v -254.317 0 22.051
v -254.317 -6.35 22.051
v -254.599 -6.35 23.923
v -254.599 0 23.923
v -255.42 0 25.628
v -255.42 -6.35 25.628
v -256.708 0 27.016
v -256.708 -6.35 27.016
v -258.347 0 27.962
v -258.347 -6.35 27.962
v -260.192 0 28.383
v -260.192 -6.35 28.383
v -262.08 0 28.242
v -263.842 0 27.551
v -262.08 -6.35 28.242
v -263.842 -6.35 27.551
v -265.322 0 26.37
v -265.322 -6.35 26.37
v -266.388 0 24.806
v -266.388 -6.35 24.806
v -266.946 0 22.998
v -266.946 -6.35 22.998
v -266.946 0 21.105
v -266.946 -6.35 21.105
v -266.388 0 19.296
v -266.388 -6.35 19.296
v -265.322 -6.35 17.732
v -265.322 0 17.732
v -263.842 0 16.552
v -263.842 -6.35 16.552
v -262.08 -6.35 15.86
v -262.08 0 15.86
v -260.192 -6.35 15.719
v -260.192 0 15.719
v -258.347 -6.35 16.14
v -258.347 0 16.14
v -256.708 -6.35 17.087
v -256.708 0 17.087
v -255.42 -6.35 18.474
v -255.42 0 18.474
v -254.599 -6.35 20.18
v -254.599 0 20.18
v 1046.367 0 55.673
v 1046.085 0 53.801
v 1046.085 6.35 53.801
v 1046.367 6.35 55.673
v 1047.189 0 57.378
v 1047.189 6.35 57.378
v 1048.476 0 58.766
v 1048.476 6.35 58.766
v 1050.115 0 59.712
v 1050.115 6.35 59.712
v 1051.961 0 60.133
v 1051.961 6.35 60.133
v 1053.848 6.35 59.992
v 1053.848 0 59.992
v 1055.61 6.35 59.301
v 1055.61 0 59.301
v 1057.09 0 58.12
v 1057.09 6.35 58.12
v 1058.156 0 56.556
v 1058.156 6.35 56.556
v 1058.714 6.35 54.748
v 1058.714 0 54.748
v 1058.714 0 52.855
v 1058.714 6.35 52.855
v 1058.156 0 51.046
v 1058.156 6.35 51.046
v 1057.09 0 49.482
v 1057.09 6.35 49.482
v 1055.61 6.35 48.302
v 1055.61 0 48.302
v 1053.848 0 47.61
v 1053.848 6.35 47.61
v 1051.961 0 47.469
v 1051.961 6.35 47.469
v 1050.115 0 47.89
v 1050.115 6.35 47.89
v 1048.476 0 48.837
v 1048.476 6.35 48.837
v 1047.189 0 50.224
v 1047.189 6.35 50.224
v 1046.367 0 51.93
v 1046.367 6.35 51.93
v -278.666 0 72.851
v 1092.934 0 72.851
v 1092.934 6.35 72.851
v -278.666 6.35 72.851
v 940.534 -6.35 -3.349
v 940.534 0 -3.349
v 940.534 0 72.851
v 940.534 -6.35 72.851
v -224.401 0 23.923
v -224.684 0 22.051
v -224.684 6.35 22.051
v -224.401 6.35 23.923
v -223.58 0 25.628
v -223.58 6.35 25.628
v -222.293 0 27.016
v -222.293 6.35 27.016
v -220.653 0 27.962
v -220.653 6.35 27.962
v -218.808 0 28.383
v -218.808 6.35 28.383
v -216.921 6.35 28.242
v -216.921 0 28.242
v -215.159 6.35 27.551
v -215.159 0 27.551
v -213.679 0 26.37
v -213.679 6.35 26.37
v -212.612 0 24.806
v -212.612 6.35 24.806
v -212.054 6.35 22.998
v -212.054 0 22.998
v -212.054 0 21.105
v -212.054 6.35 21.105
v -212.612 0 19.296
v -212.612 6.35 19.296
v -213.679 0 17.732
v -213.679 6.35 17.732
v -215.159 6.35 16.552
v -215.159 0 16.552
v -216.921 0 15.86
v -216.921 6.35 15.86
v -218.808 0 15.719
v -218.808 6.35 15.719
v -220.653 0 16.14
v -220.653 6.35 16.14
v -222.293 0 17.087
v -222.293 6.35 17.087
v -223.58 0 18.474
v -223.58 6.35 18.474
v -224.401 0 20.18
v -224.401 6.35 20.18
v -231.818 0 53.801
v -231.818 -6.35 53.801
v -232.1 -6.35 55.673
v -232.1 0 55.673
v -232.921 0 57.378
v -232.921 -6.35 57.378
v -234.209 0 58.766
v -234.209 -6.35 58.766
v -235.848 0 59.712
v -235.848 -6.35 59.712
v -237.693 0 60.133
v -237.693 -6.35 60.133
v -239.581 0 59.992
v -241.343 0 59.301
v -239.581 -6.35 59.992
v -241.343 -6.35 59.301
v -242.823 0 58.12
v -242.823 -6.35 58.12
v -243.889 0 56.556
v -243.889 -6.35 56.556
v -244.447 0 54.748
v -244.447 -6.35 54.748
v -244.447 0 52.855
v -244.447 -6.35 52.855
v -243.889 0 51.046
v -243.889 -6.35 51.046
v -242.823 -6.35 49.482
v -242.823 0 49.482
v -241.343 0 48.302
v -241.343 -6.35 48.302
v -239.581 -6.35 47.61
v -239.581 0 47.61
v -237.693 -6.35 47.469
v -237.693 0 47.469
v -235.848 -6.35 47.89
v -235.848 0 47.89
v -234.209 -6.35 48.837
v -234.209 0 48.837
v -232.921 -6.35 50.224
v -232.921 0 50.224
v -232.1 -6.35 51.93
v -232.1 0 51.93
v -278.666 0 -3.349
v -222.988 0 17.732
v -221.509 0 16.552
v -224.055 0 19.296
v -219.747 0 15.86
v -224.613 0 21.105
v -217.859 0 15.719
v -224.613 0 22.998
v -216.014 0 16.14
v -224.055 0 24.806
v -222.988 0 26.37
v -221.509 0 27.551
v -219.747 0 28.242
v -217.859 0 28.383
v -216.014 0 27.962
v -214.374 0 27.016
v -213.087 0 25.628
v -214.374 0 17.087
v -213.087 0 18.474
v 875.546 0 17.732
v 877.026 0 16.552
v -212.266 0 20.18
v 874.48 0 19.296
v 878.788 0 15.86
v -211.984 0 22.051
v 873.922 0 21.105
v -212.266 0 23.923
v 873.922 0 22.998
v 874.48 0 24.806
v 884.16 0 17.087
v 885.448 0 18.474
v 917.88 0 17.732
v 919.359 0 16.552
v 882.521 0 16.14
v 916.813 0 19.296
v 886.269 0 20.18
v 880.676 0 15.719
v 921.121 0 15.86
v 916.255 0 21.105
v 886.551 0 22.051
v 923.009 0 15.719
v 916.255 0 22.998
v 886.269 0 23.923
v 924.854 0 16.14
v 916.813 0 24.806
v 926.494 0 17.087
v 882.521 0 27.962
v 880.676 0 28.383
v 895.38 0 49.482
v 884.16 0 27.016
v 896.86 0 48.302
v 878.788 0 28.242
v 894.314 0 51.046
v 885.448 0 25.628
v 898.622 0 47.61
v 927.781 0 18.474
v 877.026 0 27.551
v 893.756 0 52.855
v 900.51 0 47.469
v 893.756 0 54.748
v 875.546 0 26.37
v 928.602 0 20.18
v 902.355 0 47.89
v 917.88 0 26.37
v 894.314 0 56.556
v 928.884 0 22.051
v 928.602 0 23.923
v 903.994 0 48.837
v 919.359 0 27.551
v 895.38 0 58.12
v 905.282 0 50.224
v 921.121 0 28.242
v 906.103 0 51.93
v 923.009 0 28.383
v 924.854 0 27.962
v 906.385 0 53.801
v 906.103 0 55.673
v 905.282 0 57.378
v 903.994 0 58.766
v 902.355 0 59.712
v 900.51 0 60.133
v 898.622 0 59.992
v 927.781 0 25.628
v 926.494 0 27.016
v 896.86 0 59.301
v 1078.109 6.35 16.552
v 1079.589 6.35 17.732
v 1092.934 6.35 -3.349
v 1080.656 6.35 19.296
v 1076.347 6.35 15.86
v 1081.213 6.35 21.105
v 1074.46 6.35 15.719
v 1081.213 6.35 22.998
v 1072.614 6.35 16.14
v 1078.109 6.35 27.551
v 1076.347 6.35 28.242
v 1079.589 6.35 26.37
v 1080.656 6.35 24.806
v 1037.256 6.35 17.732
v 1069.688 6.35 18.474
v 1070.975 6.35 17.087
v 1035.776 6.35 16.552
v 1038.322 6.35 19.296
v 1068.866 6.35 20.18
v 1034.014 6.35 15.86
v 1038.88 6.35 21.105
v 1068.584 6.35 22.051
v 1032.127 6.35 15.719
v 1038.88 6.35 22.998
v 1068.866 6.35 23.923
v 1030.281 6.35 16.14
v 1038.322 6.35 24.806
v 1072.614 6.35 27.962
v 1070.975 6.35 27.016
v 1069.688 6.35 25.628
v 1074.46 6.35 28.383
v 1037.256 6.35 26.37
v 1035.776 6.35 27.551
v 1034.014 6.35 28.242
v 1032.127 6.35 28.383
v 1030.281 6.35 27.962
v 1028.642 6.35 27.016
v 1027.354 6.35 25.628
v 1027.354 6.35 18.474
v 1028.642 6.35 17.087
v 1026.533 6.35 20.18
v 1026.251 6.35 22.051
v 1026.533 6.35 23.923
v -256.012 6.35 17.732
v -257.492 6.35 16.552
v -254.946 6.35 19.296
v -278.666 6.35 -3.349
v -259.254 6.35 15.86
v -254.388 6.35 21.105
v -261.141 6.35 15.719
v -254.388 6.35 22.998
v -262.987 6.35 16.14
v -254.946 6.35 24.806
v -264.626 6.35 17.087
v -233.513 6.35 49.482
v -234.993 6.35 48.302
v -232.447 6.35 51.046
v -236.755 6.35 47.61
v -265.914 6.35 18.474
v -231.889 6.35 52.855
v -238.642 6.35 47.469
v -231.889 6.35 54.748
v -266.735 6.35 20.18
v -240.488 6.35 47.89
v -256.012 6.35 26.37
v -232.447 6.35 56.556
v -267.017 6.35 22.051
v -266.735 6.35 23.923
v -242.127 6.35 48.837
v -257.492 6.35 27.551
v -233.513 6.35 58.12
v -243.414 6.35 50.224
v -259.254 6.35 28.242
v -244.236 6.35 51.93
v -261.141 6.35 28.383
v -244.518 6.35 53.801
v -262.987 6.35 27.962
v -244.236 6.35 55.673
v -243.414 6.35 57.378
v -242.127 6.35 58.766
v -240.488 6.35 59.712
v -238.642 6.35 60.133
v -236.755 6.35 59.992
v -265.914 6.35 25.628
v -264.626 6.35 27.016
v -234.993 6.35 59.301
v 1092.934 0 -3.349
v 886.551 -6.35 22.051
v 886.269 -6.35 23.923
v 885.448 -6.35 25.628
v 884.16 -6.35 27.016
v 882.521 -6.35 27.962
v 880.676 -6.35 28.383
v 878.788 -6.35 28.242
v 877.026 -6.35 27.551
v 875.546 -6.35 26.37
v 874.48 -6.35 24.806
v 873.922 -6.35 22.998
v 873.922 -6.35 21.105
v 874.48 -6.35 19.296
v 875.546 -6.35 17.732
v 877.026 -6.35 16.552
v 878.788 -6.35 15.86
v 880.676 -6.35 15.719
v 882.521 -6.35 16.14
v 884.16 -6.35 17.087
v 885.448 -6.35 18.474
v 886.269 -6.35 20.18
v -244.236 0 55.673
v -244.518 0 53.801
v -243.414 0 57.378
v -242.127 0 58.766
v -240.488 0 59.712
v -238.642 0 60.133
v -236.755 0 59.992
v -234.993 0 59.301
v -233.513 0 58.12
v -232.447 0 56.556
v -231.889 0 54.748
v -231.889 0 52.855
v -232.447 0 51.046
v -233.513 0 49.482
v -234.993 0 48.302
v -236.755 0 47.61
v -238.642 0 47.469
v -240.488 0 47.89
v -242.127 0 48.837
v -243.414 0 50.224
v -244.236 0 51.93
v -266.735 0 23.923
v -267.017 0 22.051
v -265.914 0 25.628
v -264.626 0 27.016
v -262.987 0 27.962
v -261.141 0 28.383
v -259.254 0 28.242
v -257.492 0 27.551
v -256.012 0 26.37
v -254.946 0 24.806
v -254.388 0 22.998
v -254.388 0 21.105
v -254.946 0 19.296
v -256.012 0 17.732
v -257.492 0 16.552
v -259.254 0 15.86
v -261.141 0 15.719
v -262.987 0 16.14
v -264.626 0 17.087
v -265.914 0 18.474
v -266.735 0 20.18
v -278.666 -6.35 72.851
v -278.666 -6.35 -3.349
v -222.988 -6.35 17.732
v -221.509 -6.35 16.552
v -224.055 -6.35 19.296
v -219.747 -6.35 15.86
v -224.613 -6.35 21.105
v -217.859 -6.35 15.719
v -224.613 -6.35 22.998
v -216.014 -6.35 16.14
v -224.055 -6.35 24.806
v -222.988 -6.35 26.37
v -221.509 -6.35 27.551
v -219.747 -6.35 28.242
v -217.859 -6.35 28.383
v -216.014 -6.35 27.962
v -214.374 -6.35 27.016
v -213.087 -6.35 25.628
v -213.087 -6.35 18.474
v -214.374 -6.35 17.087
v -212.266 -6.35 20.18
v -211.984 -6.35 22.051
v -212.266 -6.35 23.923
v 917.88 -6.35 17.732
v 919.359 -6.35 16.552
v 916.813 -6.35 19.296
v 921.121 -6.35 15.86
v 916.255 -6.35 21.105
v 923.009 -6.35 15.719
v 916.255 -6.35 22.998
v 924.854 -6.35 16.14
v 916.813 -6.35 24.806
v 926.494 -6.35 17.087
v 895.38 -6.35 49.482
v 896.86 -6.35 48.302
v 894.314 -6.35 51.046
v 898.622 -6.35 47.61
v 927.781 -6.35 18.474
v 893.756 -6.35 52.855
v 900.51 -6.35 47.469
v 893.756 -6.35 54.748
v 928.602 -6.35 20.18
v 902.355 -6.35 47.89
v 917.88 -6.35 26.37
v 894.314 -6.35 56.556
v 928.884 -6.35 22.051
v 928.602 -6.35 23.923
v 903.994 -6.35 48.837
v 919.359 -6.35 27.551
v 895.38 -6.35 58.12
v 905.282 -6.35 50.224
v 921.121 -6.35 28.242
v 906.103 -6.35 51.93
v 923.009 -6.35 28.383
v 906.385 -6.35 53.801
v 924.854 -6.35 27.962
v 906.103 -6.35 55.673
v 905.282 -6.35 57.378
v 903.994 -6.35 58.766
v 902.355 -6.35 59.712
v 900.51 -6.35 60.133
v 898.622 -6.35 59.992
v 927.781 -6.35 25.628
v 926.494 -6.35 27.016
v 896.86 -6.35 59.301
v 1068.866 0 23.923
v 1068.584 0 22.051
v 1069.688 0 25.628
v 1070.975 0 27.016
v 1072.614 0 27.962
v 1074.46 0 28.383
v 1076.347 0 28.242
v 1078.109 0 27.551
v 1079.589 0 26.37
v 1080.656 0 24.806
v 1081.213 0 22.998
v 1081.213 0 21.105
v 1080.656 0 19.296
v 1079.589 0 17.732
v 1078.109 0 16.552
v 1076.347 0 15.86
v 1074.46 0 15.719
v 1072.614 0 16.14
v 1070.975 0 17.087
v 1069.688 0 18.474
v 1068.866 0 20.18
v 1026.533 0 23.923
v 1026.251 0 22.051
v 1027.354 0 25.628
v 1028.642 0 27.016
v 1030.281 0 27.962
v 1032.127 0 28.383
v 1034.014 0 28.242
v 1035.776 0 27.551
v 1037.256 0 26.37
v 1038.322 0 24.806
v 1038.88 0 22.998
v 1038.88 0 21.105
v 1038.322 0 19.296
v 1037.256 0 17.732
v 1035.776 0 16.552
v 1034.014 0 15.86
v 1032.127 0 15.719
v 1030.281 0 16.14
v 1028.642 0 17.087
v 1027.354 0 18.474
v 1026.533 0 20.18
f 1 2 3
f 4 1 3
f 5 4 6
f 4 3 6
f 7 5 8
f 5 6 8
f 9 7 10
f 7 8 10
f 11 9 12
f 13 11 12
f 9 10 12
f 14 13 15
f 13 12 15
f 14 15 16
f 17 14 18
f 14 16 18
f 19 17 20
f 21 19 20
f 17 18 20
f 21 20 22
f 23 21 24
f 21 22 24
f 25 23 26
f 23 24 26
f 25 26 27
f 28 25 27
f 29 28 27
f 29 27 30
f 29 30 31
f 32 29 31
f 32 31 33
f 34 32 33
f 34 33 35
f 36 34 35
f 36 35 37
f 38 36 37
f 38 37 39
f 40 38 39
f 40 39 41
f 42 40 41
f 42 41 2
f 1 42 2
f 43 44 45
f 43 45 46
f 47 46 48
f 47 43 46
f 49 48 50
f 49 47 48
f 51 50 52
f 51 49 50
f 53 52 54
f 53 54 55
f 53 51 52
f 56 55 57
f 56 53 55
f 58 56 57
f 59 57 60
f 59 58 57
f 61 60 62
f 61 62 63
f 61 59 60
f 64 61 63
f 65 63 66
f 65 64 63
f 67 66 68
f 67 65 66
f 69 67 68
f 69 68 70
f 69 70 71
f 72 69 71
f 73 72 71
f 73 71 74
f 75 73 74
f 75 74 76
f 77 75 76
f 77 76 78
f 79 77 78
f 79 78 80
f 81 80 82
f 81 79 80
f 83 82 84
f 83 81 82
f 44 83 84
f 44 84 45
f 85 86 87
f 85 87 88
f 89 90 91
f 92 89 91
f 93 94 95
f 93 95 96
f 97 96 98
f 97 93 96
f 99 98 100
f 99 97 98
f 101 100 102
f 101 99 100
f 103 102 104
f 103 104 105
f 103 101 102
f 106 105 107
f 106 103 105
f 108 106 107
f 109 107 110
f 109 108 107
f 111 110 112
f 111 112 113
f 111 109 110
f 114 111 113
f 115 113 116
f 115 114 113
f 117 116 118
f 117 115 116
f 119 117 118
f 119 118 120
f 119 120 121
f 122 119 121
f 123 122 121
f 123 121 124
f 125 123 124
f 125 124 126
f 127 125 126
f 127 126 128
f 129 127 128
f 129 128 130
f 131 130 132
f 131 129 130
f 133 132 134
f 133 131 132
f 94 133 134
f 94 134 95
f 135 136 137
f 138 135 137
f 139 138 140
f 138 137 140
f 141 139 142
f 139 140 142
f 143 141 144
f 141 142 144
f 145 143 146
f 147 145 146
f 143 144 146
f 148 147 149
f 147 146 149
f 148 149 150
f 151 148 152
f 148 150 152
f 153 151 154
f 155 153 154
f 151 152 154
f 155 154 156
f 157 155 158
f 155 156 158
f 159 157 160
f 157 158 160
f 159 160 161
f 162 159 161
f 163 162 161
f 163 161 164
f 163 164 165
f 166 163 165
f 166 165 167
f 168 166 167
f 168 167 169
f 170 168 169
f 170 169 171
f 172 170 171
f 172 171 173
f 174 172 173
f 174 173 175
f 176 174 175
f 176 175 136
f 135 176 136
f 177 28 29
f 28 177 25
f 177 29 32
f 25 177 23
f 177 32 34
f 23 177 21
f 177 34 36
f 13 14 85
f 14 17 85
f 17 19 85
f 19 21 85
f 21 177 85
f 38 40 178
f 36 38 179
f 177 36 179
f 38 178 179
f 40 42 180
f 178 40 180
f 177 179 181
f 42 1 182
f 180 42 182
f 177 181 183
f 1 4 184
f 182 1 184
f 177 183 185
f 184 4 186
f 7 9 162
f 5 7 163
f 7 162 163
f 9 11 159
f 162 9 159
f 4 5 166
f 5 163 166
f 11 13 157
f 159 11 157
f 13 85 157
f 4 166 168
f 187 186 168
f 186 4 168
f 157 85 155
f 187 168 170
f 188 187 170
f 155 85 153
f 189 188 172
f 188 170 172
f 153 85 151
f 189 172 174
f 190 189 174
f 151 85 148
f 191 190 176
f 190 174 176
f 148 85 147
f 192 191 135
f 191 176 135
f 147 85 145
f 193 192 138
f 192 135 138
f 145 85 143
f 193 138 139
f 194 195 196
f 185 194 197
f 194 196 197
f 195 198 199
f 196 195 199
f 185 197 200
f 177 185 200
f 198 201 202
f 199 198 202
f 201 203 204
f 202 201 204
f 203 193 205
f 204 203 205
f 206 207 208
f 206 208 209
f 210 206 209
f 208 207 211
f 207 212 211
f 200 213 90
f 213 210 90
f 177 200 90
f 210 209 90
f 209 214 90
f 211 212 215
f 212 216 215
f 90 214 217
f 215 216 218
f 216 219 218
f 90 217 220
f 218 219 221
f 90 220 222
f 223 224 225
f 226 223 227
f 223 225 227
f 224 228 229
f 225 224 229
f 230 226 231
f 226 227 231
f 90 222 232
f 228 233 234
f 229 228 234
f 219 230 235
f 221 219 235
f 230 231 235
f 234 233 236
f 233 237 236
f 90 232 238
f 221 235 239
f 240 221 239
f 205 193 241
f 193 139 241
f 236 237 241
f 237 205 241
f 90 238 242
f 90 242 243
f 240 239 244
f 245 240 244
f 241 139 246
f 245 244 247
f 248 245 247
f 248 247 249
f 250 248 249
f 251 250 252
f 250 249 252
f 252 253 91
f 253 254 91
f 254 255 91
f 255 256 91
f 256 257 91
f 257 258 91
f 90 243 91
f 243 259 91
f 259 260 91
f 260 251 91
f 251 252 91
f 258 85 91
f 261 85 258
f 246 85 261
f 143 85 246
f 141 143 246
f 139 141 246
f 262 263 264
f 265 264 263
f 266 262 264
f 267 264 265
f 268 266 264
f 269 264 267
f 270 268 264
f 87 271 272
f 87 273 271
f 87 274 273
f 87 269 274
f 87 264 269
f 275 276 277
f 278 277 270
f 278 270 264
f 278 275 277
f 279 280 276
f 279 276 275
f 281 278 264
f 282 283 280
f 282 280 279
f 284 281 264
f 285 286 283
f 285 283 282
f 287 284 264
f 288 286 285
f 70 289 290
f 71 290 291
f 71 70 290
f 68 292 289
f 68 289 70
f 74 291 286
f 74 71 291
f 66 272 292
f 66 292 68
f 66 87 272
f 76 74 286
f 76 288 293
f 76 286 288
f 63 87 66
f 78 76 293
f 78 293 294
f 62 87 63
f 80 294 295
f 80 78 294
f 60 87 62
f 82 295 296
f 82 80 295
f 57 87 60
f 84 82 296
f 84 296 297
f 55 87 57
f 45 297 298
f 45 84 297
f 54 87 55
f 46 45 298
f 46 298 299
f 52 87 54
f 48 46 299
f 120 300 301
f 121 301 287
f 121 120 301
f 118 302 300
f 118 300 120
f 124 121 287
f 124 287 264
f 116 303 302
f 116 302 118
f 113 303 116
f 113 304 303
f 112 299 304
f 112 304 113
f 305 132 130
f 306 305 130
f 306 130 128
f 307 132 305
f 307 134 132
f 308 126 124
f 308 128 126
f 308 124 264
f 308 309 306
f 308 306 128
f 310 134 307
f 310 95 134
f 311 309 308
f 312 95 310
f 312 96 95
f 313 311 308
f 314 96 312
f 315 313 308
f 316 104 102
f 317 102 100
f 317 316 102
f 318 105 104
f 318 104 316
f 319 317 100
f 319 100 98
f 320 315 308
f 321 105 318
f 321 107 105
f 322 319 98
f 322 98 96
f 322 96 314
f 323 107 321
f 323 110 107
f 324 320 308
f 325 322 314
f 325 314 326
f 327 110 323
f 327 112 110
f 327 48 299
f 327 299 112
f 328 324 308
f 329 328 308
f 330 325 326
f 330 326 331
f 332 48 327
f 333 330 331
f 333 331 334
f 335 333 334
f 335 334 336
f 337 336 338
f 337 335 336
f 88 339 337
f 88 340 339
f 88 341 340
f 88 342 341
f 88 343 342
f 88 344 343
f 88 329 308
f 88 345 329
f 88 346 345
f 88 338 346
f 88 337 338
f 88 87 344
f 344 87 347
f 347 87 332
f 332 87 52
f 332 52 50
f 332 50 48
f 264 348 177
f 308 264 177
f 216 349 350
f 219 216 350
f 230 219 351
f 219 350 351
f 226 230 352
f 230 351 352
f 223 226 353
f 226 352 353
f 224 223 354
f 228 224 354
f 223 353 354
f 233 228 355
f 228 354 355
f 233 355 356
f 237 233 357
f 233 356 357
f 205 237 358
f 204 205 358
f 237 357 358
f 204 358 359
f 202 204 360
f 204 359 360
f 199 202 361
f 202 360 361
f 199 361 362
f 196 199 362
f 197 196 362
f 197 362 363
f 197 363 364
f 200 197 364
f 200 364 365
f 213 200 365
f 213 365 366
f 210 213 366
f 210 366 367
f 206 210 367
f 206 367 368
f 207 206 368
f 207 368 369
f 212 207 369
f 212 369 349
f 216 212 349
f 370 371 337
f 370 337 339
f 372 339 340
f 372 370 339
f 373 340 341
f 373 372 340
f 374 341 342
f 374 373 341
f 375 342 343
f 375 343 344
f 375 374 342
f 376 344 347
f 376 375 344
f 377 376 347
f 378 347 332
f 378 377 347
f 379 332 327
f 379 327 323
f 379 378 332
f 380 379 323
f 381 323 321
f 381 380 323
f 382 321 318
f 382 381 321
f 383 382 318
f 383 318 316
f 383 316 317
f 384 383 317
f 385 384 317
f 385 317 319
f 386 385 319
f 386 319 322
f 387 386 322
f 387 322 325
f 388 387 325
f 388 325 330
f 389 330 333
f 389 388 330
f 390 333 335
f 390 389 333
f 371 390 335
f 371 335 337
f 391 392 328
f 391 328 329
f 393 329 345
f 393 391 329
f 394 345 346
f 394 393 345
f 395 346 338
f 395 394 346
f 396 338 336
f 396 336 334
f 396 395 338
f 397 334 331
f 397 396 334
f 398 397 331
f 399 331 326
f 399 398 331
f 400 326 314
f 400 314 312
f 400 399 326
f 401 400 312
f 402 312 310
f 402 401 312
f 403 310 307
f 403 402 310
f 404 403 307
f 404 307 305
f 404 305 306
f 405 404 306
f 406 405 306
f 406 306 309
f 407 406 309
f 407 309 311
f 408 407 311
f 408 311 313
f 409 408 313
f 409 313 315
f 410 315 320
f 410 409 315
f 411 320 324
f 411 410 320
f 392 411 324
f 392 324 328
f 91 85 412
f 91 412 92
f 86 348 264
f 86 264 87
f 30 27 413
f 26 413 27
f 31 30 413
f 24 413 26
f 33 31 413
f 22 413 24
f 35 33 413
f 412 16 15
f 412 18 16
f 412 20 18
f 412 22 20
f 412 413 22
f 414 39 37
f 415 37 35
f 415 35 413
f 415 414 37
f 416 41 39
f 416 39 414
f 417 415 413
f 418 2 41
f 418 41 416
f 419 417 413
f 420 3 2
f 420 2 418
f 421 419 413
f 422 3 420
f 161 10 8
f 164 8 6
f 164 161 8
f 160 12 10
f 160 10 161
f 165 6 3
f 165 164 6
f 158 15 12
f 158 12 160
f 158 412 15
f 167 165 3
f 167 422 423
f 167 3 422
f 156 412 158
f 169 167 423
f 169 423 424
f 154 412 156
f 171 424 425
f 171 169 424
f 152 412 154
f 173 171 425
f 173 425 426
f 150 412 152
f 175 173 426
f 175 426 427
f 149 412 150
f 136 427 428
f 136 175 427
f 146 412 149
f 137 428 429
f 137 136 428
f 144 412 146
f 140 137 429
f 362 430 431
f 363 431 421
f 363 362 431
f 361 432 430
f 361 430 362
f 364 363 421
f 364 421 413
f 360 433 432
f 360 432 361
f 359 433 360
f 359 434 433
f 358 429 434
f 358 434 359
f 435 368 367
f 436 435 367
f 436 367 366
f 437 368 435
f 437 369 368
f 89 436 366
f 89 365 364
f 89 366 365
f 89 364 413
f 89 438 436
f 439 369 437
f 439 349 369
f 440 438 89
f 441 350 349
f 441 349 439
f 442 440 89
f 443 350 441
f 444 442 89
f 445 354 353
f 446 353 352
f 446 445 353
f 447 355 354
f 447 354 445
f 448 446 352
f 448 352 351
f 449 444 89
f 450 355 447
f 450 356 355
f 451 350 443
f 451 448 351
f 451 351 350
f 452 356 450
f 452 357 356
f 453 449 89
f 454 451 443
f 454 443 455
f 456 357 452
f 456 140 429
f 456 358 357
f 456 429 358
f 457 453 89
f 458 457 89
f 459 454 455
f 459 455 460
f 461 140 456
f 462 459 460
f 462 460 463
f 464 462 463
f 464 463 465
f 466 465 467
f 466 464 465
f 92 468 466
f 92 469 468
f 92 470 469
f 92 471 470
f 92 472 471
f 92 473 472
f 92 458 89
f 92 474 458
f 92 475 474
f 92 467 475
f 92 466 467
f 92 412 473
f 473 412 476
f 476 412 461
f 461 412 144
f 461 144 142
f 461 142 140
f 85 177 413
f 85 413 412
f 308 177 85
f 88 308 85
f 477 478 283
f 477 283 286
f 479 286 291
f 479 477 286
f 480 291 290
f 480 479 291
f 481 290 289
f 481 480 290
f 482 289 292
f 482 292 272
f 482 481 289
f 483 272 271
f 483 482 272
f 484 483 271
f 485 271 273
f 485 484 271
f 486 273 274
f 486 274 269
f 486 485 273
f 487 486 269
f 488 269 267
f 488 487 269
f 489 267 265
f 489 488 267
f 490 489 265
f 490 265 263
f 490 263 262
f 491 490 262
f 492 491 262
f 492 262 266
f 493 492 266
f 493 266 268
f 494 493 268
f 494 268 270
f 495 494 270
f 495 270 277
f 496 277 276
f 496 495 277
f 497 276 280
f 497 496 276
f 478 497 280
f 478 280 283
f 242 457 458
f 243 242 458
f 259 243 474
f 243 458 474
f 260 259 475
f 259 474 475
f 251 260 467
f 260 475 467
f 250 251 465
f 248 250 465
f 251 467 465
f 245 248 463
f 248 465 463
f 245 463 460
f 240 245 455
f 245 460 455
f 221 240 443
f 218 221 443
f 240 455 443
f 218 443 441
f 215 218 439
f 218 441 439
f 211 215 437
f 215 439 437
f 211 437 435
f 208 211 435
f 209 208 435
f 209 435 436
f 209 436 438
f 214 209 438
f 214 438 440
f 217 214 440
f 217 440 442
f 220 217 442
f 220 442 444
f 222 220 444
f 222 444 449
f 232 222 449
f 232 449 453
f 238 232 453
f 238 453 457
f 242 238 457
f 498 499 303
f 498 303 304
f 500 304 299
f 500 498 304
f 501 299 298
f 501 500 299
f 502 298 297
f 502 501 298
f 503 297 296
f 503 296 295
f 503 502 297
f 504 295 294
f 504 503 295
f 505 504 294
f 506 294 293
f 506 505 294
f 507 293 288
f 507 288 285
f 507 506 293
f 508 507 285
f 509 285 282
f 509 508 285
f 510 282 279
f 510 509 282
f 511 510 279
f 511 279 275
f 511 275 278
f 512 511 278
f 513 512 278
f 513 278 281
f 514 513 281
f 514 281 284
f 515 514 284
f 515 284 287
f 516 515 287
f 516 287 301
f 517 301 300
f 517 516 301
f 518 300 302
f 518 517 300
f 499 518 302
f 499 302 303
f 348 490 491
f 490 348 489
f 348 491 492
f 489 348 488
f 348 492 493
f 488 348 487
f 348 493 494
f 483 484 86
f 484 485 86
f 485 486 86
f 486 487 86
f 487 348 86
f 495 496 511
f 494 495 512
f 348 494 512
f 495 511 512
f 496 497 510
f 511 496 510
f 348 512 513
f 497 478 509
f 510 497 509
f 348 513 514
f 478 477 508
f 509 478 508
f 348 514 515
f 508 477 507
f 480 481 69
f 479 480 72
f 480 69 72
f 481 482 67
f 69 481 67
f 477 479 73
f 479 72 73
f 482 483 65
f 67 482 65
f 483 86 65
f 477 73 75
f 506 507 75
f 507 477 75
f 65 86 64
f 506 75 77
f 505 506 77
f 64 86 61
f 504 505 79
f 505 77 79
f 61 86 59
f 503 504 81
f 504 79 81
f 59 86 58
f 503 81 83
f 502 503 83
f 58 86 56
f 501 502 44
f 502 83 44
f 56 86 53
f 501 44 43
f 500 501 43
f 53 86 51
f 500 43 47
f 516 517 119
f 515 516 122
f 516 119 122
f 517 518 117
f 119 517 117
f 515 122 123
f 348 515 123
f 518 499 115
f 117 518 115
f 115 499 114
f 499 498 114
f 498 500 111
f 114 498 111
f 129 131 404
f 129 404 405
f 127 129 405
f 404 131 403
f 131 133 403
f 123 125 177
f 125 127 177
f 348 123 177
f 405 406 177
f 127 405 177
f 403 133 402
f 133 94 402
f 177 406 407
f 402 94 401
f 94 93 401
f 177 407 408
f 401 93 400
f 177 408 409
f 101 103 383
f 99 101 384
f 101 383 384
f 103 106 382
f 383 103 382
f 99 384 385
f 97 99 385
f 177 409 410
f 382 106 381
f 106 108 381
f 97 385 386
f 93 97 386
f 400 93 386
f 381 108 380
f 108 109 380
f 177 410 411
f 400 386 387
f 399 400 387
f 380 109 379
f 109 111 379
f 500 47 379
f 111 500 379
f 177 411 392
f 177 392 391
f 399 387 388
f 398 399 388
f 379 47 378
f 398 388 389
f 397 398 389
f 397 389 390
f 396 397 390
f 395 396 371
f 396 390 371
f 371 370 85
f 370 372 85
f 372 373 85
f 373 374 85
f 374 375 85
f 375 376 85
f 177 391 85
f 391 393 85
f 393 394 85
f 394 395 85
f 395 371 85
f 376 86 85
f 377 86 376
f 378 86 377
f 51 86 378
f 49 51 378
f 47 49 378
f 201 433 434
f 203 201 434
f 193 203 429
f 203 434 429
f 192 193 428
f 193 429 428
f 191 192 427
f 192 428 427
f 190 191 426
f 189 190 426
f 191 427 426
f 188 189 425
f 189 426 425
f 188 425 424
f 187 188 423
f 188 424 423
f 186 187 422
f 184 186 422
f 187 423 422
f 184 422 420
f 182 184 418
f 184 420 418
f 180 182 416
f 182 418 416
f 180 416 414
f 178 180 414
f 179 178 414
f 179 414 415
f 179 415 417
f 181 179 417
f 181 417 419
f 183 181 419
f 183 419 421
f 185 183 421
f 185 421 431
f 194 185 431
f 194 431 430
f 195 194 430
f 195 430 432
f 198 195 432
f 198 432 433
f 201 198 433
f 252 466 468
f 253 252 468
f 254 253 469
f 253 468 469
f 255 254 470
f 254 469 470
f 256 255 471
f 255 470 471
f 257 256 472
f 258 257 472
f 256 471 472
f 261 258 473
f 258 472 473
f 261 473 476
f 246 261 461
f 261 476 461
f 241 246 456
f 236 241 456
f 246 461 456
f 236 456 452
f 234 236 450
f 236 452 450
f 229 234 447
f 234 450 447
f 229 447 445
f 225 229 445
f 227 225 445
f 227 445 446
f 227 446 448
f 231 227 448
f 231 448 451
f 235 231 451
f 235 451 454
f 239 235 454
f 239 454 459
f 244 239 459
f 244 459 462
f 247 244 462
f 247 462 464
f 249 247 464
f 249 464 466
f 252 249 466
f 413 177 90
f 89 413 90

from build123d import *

# Parameters (mm, degrees)
F0_W     = 1219.2
F0_H     = 76.2
F1_DEPTH = 6.35
F2_R     = 6.35
F3_DEPTH = 6.351
F4_W     = 1371.6
F4_H     = 76.2
F4_R     = 6.35
F5_DEPTH = 6.35


with BuildPart() as f1:
    # F0 (on Front) → F1 (new body)
    with BuildSketch(Plane.XZ):
        with Locations((330.933747, 34.751241)):
            Rectangle(F0_W, F0_H)
    extrude(amount=F1_DEPTH)

    # F2 (on face) → F3 (cut, through all)
    with BuildSketch(Plane.XZ.offset(6.35)):
        with Locations((-238.167688, 53.801241)):
            Circle(F2_R)
        with Locations((-260.666891, 22.051241)):
            Circle(F2_R)
        with Locations((-218.333557, 22.051241)):
            Circle(F2_R)
        with Locations((900.035183, 53.801241)):
            Circle(F2_R)
        with Locations((880.201052, 22.051241)):
            Circle(F2_R)
        with Locations((922.534385, 22.051241)):
            Circle(F2_R)
    extrude(amount=-F3_DEPTH, mode=Mode.SUBTRACT)


with BuildPart() as f5:
    # F4 (on face) → F5 (new body)
    with BuildSketch(Plane(origin=(0, 0, 0), x_dir=(-1, 0, 0), z_dir=(0, 1, 0))):
        with Locations((-407.133747, 34.751241)):
            Rectangle(F4_W, F4_H)
        with Locations((-1074.934385, 22.051241)):
            Circle(F4_R, mode=Mode.SUBTRACT)
        with Locations((-1032.601052, 22.051241)):
            Circle(F4_R, mode=Mode.SUBTRACT)
        with Locations((218.333557, 22.051241)):
            Circle(F4_R, mode=Mode.SUBTRACT)
        with Locations((260.666891, 22.051241)):
            Circle(F4_R, mode=Mode.SUBTRACT)
        with Locations((-1052.435183, 53.801241)):
            Circle(F4_R, mode=Mode.SUBTRACT)
        with Locations((238.167688, 53.801241)):
            Circle(F4_R, mode=Mode.SUBTRACT)
    extrude(amount=F5_DEPTH)


solid = Compound([f1.part, f5.part])
